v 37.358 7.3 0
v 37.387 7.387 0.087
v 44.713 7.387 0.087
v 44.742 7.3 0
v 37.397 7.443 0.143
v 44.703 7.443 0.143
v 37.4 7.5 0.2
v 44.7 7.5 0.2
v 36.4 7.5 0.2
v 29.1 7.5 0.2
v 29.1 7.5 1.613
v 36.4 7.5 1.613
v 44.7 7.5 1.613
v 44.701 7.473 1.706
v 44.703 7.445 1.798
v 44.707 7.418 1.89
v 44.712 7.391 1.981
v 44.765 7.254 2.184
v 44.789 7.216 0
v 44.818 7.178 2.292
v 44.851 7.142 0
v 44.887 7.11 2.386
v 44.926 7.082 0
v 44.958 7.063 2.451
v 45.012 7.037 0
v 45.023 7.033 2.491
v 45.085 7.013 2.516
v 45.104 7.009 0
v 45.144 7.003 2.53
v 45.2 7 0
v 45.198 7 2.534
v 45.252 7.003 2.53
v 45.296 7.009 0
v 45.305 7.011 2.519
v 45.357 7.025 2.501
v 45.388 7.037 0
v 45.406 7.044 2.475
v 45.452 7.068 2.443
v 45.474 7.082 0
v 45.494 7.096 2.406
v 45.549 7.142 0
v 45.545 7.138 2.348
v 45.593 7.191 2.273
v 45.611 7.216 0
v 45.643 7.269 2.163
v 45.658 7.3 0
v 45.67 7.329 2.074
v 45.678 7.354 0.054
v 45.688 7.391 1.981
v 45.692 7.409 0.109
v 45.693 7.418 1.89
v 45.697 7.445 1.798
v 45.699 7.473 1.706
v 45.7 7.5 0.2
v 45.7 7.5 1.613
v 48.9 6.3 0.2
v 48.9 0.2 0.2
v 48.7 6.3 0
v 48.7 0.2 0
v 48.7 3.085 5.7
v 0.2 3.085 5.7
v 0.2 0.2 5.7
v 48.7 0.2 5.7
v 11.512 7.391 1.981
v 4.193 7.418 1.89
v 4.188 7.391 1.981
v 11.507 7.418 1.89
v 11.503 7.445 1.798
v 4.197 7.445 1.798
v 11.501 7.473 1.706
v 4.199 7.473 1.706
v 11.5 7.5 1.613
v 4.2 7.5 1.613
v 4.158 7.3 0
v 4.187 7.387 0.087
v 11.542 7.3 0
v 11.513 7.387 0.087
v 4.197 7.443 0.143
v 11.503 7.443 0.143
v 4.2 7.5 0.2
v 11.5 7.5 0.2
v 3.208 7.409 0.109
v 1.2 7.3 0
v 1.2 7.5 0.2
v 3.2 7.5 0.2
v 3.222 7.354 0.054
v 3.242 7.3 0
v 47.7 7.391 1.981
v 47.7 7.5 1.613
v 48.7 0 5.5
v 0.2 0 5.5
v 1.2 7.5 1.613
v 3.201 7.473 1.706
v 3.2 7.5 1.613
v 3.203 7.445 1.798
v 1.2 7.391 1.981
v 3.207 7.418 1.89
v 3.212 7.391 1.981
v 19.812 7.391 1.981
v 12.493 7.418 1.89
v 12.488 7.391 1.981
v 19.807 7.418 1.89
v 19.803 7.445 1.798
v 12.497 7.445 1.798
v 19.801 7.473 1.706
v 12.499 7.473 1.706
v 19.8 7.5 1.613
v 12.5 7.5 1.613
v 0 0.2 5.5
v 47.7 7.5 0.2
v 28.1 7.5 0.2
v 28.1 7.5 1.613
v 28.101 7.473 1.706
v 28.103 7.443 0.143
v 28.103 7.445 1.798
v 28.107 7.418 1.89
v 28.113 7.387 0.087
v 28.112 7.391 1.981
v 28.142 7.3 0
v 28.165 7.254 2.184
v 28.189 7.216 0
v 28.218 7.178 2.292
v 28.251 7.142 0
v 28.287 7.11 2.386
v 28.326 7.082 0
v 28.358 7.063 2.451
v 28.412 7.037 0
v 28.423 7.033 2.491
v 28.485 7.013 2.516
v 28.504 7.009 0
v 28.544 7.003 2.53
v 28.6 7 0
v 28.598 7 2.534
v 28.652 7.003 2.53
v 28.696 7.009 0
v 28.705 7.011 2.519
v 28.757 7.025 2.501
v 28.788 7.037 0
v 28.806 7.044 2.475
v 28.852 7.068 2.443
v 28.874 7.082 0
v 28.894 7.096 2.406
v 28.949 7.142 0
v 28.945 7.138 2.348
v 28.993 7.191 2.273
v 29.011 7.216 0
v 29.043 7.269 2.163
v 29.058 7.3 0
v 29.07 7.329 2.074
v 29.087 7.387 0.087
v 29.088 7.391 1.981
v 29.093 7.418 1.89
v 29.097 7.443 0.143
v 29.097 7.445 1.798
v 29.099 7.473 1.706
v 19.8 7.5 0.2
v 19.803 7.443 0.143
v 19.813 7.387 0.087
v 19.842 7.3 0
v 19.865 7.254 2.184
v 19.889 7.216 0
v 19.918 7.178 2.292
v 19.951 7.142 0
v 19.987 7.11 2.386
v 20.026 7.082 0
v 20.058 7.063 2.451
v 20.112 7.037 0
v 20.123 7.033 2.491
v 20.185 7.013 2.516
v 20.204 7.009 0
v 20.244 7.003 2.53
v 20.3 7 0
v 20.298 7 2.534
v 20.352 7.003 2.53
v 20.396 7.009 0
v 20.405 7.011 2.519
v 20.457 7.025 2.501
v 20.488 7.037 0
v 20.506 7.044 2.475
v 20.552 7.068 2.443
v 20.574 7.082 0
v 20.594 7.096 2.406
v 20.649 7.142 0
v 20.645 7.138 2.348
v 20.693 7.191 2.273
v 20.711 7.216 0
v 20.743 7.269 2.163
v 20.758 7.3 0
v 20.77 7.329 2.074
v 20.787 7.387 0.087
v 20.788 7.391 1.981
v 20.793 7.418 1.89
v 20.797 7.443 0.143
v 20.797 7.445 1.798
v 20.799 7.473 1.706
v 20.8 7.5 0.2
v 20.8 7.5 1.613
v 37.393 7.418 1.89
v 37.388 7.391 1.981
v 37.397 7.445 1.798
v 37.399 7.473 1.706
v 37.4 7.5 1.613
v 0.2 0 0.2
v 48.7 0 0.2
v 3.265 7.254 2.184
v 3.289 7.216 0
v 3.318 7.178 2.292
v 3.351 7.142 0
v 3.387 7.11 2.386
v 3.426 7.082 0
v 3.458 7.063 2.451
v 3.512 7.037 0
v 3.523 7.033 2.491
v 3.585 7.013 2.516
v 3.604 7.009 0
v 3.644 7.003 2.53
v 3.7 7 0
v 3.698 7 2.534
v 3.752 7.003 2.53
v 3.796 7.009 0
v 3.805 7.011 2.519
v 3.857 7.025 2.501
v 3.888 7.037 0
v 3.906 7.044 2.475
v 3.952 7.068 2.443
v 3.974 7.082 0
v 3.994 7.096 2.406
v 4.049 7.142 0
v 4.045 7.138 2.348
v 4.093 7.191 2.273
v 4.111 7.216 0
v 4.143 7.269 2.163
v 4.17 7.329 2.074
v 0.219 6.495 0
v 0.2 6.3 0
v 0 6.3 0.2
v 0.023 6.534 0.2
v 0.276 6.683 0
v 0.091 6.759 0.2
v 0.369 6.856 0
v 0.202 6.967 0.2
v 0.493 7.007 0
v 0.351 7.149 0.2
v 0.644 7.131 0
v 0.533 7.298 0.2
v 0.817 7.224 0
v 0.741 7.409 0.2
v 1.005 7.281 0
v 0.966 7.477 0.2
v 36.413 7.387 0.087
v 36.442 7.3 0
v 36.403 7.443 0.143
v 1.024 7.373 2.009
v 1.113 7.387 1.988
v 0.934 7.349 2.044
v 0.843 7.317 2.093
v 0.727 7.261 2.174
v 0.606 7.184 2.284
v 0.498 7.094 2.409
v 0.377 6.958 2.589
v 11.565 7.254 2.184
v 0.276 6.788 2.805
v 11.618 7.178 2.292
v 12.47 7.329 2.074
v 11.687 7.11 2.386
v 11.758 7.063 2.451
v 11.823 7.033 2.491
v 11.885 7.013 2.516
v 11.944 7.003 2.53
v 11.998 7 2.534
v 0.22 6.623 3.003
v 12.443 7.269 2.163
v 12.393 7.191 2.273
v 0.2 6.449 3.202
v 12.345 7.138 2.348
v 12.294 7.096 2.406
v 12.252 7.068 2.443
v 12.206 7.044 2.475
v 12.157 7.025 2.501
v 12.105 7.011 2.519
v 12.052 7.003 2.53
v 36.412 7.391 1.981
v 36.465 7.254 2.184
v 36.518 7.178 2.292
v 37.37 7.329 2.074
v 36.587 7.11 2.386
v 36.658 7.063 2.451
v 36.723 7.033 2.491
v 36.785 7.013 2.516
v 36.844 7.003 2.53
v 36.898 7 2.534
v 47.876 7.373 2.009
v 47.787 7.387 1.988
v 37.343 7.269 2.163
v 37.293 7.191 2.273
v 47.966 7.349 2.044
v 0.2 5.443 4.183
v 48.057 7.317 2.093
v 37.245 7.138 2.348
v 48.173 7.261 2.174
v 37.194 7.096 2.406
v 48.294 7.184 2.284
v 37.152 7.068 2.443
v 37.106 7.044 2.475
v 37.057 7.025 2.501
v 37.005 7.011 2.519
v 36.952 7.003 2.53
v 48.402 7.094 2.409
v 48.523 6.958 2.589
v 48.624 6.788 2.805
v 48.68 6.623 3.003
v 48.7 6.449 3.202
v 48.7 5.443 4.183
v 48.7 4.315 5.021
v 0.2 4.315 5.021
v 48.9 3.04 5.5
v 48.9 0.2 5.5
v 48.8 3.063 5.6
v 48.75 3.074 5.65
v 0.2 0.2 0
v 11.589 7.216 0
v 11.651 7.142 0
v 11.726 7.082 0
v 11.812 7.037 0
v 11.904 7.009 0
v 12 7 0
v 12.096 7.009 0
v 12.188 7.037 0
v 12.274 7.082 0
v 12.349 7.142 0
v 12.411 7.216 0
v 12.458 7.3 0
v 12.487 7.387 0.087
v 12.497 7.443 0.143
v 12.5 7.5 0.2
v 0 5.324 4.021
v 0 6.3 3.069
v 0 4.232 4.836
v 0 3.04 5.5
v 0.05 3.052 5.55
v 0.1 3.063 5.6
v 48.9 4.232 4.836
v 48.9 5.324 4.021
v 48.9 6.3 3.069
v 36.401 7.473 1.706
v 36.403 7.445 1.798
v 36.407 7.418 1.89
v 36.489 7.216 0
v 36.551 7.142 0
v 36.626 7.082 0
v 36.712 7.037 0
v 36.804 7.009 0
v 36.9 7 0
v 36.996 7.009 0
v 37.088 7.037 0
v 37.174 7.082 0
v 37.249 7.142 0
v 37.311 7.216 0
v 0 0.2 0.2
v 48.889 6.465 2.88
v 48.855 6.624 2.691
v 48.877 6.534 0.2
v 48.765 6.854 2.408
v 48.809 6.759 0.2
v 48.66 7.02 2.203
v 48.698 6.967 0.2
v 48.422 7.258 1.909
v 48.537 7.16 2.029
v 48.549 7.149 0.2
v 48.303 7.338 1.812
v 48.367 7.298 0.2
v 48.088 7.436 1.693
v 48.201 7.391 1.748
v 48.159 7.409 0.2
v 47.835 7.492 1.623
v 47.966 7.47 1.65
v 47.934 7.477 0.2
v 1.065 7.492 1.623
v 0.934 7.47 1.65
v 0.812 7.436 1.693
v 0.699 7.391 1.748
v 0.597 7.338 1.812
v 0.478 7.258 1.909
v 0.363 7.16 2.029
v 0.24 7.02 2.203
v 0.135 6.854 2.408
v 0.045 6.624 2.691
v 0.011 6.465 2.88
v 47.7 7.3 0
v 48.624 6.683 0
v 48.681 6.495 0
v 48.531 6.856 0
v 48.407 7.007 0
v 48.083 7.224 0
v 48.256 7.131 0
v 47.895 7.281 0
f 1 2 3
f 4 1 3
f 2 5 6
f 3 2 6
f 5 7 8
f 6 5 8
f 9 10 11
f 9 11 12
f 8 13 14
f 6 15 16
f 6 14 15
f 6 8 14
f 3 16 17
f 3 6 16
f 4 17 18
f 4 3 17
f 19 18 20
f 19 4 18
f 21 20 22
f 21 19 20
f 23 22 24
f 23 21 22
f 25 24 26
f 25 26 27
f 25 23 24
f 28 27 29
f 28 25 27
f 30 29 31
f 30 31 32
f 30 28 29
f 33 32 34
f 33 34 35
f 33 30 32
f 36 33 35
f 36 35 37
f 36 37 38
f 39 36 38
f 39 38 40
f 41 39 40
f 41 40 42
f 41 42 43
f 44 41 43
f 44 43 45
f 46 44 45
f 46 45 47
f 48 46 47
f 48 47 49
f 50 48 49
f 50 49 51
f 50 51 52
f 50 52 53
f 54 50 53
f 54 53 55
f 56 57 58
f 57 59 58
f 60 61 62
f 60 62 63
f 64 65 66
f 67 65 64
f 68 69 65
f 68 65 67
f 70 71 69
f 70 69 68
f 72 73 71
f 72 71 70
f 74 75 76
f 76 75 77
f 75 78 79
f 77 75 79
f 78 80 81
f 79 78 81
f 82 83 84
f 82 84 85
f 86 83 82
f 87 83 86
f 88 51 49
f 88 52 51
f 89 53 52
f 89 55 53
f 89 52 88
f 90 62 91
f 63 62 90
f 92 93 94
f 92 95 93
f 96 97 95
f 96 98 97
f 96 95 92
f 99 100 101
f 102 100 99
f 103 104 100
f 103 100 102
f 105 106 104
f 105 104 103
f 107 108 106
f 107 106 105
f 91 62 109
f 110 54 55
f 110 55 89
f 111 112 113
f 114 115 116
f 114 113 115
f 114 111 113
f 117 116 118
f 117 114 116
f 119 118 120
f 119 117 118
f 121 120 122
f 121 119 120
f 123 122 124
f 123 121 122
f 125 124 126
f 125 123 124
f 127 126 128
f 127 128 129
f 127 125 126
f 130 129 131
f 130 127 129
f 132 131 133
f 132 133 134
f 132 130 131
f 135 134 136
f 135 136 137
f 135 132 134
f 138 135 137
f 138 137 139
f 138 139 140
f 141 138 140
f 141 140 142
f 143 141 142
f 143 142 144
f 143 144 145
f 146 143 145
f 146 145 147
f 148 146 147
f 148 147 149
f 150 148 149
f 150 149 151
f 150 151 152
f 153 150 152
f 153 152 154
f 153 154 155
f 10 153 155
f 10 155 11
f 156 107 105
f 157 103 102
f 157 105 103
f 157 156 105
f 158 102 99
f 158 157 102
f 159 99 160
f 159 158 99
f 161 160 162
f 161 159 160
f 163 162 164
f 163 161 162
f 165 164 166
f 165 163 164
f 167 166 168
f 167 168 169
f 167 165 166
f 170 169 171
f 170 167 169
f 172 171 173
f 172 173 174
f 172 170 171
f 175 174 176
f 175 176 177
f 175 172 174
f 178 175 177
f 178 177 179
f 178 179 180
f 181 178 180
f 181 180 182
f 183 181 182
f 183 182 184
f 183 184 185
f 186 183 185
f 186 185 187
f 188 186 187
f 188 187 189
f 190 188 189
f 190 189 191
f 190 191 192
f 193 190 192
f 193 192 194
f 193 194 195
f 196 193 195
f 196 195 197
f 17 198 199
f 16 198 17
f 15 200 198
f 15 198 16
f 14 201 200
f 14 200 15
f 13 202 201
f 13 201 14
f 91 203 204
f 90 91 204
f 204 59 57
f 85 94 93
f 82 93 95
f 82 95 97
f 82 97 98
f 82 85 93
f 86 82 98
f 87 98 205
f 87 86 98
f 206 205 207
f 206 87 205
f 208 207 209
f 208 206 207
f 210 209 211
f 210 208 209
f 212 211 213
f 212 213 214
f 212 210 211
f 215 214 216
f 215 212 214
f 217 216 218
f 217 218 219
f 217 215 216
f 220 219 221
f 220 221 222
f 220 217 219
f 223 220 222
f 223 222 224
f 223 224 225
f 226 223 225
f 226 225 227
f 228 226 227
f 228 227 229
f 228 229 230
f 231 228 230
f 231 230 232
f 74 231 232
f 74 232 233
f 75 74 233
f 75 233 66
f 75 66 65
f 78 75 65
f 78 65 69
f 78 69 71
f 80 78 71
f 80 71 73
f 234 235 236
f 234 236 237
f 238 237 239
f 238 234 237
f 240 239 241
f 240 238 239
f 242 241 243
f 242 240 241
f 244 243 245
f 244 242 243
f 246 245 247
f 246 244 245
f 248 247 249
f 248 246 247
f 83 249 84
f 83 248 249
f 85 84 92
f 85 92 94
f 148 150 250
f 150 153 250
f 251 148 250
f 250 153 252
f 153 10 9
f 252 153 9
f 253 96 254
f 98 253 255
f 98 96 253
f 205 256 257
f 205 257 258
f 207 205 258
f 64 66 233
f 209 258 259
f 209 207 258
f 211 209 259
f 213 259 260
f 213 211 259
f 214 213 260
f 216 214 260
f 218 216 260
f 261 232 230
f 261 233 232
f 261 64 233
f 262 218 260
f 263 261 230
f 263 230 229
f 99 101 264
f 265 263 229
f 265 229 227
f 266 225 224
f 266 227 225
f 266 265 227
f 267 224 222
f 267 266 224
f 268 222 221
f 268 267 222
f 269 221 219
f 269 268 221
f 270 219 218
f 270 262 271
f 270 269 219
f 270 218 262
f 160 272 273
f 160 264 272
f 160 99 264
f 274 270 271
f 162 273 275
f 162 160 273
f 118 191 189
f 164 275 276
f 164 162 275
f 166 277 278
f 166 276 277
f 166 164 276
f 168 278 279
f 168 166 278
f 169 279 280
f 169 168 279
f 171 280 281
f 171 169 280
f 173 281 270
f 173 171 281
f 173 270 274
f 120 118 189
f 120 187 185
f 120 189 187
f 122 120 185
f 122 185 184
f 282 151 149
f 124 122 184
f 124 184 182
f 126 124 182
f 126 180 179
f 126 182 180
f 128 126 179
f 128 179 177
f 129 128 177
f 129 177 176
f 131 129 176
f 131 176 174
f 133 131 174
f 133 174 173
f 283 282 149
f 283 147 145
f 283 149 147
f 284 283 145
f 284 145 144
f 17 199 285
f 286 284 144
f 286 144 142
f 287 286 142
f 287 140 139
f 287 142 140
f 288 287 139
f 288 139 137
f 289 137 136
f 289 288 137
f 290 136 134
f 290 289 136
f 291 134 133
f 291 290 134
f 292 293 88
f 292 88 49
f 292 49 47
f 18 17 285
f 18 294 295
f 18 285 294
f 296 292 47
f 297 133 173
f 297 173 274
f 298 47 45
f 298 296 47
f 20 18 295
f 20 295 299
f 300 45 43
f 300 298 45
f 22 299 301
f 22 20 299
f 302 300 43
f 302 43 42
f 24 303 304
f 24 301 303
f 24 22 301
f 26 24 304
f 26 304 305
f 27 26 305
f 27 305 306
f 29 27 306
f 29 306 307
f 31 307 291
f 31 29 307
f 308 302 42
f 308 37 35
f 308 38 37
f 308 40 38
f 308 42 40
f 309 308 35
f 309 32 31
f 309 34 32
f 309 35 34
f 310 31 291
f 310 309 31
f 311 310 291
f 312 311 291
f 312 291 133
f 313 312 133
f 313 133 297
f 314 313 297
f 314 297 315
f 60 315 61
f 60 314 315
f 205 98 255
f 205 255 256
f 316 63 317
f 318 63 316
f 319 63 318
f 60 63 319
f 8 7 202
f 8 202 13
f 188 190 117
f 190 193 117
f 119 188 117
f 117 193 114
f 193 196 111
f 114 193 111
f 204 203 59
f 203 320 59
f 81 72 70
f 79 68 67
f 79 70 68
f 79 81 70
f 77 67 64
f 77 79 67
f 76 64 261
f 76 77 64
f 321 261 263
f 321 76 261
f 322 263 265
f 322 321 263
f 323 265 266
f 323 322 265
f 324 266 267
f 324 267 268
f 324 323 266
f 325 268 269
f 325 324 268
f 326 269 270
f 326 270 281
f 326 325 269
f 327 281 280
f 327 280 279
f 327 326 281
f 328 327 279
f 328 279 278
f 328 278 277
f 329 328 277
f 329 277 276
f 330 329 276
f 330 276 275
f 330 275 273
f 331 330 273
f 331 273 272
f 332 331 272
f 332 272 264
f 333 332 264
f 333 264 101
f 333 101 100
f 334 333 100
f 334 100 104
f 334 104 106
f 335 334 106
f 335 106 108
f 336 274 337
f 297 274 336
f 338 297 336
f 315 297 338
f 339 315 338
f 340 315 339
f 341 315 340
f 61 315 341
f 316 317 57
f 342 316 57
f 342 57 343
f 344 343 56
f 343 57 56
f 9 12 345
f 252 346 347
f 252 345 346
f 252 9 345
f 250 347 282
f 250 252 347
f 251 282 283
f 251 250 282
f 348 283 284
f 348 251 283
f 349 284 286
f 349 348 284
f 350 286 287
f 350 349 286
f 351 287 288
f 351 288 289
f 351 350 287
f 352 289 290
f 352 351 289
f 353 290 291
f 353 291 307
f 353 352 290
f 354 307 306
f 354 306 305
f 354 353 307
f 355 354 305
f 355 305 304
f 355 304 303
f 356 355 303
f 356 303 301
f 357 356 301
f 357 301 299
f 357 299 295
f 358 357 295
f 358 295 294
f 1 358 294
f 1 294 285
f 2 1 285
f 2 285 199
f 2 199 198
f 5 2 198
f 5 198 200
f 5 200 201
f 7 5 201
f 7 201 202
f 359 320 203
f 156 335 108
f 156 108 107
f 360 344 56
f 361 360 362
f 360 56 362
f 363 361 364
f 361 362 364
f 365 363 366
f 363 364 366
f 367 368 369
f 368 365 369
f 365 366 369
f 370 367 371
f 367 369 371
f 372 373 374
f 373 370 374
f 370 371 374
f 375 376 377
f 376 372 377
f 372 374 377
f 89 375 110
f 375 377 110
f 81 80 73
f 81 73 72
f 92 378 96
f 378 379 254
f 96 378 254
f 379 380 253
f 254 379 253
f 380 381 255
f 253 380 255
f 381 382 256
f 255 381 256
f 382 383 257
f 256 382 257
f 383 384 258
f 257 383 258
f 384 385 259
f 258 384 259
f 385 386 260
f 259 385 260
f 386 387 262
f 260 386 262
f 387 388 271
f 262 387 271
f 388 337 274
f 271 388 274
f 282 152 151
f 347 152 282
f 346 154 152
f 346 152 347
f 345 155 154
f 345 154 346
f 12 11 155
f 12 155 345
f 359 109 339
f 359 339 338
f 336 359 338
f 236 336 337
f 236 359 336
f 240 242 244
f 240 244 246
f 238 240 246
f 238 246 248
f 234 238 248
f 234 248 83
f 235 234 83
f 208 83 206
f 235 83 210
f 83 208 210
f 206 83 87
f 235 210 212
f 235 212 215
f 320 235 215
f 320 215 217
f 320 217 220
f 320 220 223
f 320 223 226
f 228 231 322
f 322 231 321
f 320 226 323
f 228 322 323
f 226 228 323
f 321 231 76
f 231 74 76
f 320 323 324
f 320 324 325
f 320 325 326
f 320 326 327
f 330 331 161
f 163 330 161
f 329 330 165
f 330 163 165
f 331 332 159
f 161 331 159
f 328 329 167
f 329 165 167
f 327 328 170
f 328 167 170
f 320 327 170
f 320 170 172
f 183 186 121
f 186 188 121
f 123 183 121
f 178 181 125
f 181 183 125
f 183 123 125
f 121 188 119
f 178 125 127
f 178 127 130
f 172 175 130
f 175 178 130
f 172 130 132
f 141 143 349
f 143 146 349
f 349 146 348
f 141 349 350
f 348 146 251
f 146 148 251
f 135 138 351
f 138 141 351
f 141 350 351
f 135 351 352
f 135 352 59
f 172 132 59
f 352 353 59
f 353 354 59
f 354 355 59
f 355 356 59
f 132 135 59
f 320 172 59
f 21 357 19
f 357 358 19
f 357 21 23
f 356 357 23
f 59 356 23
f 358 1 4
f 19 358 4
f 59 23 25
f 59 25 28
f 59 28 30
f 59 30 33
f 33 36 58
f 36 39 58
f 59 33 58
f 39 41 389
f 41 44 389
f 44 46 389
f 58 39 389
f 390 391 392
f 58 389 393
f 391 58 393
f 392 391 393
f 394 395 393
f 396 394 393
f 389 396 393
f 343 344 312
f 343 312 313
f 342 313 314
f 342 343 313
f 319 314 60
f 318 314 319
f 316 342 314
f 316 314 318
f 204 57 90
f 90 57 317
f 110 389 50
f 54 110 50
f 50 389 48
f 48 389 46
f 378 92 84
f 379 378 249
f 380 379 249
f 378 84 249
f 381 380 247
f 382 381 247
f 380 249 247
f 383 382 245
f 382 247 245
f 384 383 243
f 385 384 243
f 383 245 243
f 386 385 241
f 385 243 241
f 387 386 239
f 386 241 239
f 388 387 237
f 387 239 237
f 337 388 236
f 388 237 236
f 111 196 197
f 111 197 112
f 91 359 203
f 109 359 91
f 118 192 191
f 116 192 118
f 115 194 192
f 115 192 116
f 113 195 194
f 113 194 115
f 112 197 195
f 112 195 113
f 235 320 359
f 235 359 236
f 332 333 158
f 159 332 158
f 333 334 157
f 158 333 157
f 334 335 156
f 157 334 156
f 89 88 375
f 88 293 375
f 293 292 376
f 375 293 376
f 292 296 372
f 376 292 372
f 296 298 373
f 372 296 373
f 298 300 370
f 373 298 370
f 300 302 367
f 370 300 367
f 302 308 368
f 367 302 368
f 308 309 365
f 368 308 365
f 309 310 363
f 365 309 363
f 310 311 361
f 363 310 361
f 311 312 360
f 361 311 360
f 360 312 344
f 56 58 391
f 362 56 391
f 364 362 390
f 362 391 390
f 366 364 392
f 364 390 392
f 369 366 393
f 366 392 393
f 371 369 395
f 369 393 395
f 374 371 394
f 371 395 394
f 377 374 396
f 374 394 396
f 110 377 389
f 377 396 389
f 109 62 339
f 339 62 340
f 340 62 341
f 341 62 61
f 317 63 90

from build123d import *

# Parameters (mm, degrees)
PAD_DEPTH    = 5.7
POCKET_DEPTH = 48.9
CHAMFER_SIZE = 0.2


with BuildPart() as part:
    # Sketch → Pad (new body)
    with BuildSketch(Plane.XY):
        with BuildLine():
            Line((0, 0), (48.9, 0))
            Line((48.9, 0), (48.9, 6.3))
            ThreePointArc((48.9, 6.3), (48.548528, 7.148528), (47.7, 7.5))
            Line((45.7, 7.5), (47.7, 7.5))
            ThreePointArc((44.7, 7.5), (45.2, 7), (45.7, 7.5))
            Line((37.4, 7.5), (44.7, 7.5))
            ThreePointArc((36.4, 7.5), (36.9, 7), (37.4, 7.5))
            Line((29.1, 7.5), (36.4, 7.5))
            ThreePointArc((28.1, 7.5), (28.6, 7), (29.1, 7.5))
            Line((20.8, 7.5), (28.1, 7.5))
            ThreePointArc((19.8, 7.5), (20.3, 7), (20.8, 7.5))
            Line((12.5, 7.5), (19.8, 7.5))
            ThreePointArc((11.5, 7.5), (12, 7), (12.5, 7.5))
            Line((4.2, 7.5), (11.5, 7.5))
            ThreePointArc((3.2, 7.5), (3.7, 7), (4.2, 7.5))
            Line((1.2, 7.5), (3.2, 7.5))
            ThreePointArc((1.2, 7.5), (0.351472, 7.148528), (0, 6.3))
            Line((0, 0), (0, 6.3))
        make_face()
    extrude(amount=PAD_DEPTH)

    # Sketch001 (on Face5 of Pad) → Pocket (cut)
    with BuildSketch(Plane.YZ.offset(48.9)):
        with BuildLine():
            ThreePointArc((8.415971, 0), (5.112438, 4.453311), (0, 6.6))
            Line((0, 6.6), (8.415971, 6.6))
            Line((8.415971, 0), (8.415971, 6.6))
        make_face()
    extrude(amount=-POCKET_DEPTH, mode=Mode.SUBTRACT)

    # Chamfer
    chamfer_edges = [part.edges().sort_by_distance(p)[0] for p in [
        (48.9, 3.15, 0),
        (24.45, 0, 0),
        (0, 3.15, 0),
        (7.85, 7.5, 0),
        (16.15, 7.5, 0),
        (24.45, 7.5, 0),
        (32.75, 7.5, 0),
        (41.05, 7.5, 0),
        (0, 4.804183, 4.686015),
        (7.85, 7.5, 1.813377),
        (16.15, 7.5, 1.813377),
        (24.45, 7.5, 1.813377),
        (32.75, 7.5, 1.813377),
        (41.05, 7.5, 1.813377),
        (46.7, 7.5, 1.813377),
        (24.45, 0, 5.7),
        (48.9, 1.542589, 5.7),
        (0, 1.542589, 5.7),
        (48.9, 4.804183, 4.686015),
        (0, 0, 2.85),
        (48.9, 0, 2.85),
    ]]
    chamfer(chamfer_edges, length=CHAMFER_SIZE)


solid = part.part
